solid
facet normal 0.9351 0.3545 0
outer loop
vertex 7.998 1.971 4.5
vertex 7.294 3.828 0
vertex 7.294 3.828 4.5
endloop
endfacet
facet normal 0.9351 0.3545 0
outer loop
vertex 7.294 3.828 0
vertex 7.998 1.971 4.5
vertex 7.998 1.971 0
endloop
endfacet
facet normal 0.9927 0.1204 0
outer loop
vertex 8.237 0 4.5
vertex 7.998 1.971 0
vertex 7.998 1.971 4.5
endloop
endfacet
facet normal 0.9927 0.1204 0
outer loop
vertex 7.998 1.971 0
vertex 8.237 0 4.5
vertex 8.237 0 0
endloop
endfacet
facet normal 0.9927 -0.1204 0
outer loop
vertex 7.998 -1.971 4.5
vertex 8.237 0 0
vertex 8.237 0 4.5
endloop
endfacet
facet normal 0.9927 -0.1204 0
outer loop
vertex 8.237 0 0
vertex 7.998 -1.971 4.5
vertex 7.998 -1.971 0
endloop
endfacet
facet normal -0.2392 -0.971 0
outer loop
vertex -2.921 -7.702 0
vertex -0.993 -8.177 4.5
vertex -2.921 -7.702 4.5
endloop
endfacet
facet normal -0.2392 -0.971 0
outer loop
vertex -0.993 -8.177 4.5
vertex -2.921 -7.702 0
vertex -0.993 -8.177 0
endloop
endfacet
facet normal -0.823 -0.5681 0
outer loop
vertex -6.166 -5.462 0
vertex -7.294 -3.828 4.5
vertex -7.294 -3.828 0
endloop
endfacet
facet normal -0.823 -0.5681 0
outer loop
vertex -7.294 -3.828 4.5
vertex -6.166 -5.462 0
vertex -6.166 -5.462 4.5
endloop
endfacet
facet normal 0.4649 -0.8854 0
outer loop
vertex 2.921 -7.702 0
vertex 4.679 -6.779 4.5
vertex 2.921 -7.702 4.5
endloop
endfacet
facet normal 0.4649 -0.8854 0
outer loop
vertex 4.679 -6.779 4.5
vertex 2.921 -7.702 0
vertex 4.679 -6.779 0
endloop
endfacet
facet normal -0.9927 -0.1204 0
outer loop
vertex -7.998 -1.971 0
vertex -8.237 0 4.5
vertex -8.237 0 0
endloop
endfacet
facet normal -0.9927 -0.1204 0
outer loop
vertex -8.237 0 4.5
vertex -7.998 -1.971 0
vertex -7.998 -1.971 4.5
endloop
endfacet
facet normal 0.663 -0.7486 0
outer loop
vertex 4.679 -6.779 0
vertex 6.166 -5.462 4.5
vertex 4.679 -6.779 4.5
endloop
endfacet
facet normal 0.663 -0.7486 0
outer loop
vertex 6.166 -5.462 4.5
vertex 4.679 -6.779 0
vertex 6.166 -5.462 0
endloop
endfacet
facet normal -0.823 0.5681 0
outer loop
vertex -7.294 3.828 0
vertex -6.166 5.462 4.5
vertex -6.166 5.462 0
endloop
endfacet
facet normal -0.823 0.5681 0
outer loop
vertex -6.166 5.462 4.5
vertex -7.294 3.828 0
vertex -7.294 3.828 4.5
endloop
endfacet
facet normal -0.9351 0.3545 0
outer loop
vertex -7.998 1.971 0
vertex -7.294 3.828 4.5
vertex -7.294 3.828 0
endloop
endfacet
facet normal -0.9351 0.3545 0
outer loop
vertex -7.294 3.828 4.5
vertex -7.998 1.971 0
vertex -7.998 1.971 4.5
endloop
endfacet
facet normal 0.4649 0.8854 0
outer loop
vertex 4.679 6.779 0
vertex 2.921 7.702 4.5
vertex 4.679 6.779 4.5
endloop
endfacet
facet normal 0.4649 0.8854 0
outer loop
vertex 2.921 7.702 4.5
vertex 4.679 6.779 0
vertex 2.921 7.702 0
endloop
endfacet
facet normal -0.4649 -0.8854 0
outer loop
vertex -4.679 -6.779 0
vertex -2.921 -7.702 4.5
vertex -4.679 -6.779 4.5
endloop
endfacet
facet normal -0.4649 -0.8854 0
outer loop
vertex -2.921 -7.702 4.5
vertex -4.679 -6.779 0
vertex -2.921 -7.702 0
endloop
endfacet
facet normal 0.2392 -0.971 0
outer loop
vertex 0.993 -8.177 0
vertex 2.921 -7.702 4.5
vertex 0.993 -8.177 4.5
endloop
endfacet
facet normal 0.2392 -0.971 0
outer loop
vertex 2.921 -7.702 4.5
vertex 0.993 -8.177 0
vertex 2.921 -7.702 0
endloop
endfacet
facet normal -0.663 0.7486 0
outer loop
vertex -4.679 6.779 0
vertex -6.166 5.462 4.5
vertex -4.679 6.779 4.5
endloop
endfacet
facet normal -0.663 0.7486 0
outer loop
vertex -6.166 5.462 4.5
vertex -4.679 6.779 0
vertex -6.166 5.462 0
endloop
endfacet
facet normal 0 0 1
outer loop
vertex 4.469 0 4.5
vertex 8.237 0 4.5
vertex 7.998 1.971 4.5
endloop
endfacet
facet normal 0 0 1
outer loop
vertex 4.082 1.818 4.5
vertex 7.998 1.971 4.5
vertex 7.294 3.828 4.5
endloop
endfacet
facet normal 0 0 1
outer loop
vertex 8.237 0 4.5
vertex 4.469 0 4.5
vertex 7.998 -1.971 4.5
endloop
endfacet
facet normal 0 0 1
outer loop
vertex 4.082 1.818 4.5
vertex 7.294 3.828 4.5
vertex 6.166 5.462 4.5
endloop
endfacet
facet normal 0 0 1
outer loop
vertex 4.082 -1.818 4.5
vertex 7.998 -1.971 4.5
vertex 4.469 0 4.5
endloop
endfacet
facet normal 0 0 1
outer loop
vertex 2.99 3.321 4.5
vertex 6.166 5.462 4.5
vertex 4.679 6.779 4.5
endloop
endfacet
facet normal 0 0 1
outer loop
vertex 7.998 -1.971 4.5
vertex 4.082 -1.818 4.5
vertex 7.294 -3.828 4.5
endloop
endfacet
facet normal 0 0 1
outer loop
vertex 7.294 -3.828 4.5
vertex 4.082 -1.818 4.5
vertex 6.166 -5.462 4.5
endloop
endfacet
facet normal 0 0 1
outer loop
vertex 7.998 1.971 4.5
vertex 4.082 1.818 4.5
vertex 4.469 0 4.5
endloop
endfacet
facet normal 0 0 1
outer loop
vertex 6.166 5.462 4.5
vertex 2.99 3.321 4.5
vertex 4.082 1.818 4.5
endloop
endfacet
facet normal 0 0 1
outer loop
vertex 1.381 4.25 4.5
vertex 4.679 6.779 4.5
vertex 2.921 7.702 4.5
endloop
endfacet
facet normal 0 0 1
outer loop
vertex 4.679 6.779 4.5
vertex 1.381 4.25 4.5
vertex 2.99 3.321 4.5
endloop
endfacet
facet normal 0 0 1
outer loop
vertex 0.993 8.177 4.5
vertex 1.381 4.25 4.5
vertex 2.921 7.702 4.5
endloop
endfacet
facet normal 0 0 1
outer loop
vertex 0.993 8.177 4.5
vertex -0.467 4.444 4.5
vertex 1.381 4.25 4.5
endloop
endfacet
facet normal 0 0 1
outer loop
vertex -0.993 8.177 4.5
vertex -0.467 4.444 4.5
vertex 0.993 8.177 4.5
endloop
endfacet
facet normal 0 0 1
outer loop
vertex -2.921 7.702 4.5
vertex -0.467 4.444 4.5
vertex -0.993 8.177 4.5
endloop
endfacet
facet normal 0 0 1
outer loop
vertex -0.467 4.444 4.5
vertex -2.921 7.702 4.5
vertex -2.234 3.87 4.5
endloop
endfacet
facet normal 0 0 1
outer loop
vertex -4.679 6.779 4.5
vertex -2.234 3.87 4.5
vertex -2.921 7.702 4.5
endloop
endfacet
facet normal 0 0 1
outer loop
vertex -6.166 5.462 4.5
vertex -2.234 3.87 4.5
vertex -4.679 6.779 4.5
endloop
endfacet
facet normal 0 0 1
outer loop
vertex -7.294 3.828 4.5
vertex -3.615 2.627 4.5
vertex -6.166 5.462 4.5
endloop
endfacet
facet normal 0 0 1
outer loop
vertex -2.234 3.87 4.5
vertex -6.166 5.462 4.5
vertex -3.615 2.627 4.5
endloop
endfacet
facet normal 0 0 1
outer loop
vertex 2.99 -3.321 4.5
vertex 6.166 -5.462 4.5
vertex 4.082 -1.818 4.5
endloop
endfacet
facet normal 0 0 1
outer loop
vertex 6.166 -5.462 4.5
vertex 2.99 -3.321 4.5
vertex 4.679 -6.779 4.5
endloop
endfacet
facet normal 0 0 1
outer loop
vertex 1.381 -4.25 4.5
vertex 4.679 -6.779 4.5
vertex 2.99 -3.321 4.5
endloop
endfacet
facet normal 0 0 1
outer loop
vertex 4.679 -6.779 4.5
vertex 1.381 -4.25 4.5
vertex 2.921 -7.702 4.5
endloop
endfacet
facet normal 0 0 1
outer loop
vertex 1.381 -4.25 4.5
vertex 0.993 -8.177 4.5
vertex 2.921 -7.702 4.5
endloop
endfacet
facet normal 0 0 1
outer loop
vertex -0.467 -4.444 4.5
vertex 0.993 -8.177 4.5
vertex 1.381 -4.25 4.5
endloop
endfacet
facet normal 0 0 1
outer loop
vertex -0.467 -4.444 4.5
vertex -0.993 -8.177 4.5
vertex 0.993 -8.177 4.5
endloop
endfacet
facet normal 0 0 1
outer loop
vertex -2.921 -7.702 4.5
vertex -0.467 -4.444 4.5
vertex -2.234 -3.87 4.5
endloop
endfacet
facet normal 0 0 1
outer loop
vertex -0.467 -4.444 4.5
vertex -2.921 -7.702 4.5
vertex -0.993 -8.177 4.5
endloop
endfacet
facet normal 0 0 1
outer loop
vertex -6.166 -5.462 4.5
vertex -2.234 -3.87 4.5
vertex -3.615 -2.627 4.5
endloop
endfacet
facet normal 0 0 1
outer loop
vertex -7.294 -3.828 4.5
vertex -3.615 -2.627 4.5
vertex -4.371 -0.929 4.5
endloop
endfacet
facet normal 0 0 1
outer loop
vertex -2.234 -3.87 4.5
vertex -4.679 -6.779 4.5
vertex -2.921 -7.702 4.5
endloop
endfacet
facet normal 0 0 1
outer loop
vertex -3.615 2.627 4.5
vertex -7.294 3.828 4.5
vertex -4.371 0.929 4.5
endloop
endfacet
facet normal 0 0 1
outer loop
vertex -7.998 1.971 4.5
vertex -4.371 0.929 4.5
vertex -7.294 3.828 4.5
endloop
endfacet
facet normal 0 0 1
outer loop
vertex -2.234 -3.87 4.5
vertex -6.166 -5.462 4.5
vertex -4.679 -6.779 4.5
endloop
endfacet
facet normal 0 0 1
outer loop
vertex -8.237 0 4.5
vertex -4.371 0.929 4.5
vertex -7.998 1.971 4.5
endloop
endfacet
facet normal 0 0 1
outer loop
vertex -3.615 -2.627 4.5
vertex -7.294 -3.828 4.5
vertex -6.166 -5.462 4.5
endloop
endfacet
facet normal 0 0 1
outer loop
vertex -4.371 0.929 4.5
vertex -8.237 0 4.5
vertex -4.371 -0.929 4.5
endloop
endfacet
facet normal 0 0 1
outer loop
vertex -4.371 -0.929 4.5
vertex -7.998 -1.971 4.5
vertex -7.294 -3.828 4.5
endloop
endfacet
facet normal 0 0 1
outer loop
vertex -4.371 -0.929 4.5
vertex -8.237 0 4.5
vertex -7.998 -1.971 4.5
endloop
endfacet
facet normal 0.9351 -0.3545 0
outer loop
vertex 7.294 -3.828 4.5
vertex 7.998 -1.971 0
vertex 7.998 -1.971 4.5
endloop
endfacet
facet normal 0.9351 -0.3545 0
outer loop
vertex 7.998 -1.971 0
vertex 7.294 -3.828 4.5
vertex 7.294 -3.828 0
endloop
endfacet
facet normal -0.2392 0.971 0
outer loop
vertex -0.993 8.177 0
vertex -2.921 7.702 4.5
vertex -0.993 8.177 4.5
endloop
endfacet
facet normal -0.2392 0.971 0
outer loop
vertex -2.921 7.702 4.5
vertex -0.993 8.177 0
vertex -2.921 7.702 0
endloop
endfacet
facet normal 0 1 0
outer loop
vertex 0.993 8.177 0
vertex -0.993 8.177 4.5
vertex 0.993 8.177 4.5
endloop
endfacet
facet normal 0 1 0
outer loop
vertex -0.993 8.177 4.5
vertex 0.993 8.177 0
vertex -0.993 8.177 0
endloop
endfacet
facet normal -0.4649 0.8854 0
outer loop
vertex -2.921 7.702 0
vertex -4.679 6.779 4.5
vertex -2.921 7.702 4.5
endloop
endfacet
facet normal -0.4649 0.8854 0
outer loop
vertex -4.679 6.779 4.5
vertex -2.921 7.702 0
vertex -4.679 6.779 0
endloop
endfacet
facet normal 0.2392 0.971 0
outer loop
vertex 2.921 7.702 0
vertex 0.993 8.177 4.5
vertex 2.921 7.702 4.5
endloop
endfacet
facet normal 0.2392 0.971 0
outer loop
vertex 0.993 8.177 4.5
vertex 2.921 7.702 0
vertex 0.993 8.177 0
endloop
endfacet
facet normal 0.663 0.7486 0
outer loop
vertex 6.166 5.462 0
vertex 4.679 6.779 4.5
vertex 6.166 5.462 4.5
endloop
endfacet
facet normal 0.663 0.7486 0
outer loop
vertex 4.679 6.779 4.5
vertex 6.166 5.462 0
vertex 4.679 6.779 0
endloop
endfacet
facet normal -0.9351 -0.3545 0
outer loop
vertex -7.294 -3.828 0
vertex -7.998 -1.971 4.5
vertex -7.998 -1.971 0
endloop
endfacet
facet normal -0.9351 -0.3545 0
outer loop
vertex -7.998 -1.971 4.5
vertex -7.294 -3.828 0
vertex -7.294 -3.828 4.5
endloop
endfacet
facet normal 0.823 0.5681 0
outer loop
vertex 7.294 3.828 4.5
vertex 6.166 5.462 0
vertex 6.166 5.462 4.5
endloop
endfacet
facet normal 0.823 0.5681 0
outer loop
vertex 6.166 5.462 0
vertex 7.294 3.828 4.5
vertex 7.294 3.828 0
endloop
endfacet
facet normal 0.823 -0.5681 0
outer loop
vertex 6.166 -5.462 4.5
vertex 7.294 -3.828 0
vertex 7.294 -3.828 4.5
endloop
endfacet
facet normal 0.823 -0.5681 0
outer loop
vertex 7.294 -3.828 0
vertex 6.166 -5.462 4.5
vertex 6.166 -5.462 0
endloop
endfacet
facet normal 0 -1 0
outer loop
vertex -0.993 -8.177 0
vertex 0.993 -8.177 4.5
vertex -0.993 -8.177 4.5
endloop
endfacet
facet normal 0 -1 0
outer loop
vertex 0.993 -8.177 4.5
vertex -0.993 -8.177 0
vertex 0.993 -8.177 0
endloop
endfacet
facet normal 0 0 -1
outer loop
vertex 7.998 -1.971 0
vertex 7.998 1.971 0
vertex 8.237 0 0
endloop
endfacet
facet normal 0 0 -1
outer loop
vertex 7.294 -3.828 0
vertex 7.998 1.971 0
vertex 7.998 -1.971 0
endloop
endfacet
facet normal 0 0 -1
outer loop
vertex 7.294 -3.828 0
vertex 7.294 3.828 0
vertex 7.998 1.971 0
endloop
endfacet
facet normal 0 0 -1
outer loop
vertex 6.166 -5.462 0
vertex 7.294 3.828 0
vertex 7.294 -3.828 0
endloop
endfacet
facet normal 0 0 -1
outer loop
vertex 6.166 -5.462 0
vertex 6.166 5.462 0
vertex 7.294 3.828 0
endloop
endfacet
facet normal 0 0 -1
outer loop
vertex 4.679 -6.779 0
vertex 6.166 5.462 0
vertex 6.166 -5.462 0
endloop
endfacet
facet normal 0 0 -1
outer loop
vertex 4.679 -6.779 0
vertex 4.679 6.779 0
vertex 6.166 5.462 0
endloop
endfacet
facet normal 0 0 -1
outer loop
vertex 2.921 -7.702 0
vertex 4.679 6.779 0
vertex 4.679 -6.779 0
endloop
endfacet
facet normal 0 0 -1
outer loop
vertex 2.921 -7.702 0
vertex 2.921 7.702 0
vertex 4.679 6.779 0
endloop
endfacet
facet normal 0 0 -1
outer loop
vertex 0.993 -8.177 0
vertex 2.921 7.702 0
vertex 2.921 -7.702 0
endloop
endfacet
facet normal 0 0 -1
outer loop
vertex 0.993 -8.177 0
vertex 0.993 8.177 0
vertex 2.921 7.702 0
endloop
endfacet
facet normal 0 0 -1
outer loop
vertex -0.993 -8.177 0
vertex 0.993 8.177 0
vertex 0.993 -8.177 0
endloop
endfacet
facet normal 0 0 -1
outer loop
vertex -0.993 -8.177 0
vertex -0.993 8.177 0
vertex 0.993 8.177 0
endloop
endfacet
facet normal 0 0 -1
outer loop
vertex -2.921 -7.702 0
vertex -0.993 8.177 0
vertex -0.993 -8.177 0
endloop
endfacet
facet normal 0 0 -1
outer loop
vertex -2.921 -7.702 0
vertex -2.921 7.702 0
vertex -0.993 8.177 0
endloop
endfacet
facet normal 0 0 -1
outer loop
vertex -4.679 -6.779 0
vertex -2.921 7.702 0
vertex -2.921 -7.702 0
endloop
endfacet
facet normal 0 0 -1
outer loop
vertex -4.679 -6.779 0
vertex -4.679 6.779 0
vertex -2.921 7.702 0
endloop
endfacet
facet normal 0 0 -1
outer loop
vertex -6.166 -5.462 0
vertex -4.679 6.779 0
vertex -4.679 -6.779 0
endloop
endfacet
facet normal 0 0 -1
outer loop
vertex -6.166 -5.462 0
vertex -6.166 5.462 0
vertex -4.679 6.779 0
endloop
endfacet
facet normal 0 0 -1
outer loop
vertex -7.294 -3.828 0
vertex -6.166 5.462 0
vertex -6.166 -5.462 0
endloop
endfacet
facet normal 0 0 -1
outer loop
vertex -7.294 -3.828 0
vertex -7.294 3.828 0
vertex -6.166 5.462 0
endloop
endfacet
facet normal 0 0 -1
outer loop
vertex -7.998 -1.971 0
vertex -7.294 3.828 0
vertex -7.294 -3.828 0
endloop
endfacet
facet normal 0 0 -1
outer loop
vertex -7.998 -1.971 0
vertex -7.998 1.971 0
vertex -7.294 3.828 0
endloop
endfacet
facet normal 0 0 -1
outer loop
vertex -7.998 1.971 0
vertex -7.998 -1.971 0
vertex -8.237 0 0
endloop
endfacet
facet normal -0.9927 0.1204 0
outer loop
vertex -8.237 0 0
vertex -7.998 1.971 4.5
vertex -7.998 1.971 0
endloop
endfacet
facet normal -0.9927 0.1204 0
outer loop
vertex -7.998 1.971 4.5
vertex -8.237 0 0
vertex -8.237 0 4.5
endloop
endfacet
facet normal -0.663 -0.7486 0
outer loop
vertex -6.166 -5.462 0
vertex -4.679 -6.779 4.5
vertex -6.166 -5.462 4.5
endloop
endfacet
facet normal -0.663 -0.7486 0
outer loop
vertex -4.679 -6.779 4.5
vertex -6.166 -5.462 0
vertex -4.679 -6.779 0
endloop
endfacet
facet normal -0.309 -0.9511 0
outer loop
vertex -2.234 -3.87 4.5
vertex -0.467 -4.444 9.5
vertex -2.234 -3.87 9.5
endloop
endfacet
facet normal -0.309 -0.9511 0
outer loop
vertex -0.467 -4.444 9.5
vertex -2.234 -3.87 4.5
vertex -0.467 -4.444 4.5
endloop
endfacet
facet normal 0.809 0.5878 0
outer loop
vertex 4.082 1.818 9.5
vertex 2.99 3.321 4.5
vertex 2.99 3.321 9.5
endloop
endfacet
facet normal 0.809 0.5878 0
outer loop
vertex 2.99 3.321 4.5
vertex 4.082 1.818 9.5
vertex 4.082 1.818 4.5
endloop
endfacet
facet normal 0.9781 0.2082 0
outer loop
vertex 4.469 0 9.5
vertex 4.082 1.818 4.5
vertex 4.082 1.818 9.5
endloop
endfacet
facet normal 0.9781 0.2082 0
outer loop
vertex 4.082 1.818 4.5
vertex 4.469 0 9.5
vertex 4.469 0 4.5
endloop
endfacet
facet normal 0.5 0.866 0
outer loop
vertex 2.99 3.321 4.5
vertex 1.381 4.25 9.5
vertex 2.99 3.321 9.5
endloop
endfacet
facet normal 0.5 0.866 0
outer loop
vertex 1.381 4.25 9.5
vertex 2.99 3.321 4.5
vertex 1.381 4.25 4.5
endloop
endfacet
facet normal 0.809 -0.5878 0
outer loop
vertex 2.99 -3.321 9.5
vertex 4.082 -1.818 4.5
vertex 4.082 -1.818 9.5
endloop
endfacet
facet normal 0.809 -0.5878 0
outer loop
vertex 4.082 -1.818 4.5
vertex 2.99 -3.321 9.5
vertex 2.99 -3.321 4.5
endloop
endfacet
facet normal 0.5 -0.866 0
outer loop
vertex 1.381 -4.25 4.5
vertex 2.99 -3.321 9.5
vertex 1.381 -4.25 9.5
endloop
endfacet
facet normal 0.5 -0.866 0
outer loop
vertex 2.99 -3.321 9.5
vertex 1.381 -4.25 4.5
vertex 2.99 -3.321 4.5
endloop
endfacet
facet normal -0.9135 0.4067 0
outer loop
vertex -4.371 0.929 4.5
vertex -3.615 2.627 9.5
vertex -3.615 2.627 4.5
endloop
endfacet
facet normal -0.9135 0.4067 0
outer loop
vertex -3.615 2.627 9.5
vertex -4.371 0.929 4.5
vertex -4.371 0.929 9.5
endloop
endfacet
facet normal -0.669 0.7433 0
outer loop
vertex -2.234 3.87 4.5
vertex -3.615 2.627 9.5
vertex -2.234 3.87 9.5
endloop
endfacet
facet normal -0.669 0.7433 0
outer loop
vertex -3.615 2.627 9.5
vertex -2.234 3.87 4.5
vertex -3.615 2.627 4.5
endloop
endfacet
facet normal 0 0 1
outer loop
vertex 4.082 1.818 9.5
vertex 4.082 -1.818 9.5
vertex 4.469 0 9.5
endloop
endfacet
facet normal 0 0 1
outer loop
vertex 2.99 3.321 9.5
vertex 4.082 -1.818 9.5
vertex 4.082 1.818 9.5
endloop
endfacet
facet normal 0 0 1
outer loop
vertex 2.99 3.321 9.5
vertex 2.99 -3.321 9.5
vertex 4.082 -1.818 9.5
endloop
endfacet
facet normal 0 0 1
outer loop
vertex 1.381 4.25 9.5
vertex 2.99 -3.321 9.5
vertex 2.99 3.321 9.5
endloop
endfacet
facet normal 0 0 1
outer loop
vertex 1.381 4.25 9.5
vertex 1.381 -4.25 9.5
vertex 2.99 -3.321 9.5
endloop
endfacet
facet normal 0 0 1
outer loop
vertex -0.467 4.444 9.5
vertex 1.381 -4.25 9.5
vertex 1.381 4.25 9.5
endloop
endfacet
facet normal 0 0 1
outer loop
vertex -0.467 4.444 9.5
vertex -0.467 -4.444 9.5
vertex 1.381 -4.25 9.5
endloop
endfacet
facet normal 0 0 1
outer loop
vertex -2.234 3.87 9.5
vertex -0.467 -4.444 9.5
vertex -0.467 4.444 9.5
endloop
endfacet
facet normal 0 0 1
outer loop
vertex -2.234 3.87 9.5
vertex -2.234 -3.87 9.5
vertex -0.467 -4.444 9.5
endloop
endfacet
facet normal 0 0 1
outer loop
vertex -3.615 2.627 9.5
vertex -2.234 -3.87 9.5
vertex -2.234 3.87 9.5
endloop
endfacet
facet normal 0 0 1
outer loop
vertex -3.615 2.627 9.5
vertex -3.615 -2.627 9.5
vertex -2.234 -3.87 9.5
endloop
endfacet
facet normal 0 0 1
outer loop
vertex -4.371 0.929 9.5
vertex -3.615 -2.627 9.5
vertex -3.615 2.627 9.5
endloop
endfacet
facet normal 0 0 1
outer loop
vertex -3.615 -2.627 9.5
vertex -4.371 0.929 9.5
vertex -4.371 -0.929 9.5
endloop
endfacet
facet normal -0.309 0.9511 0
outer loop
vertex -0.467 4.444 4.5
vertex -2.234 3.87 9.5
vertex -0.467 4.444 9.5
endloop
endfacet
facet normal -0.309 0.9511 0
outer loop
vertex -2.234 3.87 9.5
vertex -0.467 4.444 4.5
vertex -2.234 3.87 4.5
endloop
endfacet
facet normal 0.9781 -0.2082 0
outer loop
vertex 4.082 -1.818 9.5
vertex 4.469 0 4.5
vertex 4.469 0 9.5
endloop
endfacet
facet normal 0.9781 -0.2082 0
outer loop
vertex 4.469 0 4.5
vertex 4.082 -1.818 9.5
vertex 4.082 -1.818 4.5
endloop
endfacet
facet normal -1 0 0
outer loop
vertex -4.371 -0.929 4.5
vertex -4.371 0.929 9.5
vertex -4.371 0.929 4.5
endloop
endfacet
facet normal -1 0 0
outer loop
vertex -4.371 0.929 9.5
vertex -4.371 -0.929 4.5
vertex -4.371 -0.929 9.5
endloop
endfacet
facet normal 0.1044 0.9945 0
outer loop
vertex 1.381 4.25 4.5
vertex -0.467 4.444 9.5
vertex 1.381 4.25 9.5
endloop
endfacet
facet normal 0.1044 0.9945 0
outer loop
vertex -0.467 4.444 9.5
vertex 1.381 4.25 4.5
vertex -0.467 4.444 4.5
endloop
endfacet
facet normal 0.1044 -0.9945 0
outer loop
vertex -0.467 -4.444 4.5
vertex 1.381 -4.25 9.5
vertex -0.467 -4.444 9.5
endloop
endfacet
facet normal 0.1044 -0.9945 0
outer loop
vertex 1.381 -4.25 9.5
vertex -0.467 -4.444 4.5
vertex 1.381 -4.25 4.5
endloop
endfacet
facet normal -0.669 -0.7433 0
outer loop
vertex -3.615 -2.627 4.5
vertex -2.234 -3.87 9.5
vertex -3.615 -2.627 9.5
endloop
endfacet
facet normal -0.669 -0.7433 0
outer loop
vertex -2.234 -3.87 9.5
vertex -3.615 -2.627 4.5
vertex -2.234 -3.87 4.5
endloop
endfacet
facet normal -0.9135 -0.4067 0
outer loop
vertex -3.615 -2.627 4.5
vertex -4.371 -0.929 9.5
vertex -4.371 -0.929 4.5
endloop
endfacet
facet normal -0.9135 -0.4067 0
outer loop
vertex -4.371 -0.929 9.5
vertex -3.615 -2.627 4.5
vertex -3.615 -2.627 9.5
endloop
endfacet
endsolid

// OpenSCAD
// =====================================================
// CALCULADORA DE AVELLANADO - TORNILLOS WHITWORTH (BSW)
// El diámetro de rosca se ingresa en PULGADAS (decimal)
// Ej: 1/4" = 0.25 , 3/8" = 0.375 , 1/2" = 0.5
// =====================================================

PULGADA = 25.4; // mm por pulgada

// Convierte pulgadas a mm
function pulg_a_mm(p) = p * PULGADA;

// Tabla de diámetros nominales Whitworth más comunes (en pulgadas)
// junto a su equivalente en mm, para referencia:
// 1/8"  = 3.175 mm      5/16" = 7.938 mm      5/8" = 15.875 mm
// 3/16" = 4.763 mm      3/8"  = 9.525 mm      3/4" = 19.050 mm
// 1/4"  = 6.350 mm      7/16" = 11.113 mm     7/8" = 22.225 mm
// 5/16" = 7.938 mm      1/2"  = 12.700 mm     1"   = 25.400 mm

// Función que calcula [DK, K] en mm según el diámetro de rosca
// D_pulg: diámetro nominal en pulgadas (ej: 0.25 para 1/4")
// NOTA: al no existir una norma DIN/ISO de cabeza avellanada para
// Whitworth, se usa la regla práctica DK≈2*D, K≈0.6*D.
// Ajustar si contás con la tabla real del fabricante.
function cabeza_tornillo_whitworth(D_pulg) =
    let(D = pulg_a_mm(D_pulg))
    [D * 2.0, D * 0.6];

// =====================================================
// MÓDULO: AVELLANADO PARA TORNILLO WHITWORTH
// =====================================================
module avellanado_cilindrico_whitworth(
    diametro_rosca_pulg,      // Diámetro del tornillo en PULGADAS
    profundidad_avellano,     // Profundidad del avellanado en mm
    holgura = 0.3             // Holgura para el diámetro en mm
) {
    datos = cabeza_tornillo_whitworth(diametro_rosca_pulg);
    diametro_cabeza = datos[0];

    translate([0, 0, 0])
        cylinder(h = profundidad_avellano,
                 r = (diametro_cabeza/2) + holgura);
}

// =====================================================
// MÓDULO: AGUJERO PASANTE PARA TORNILLO WHITWORTH
// =====================================================
module agujero_pasante_whitworth(
    diametro_rosca_pulg,       // Diámetro del tornillo en PULGADAS
    profundidad,                // Profundidad total del agujero
    profundidad_avellano = 0,   // Suma del hueco de avellanado
    holgura = 0.5,               // Holgura para el diámetro en mm
    profundidad_abs = true
) {
    diametro_rosca_mm = pulg_a_mm(diametro_rosca_pulg);

    if (profundidad_abs)
        translate([0, 0, profundidad_avellano])
            cylinder(h = profundidad - profundidad_avellano,
                     r = (diametro_rosca_mm/2) + holgura);
    else
        translate([0, 0, profundidad_avellano])
            cylinder(h = profundidad,
                     r = (diametro_rosca_mm/2) + holgura);
}

// =====================================================
// MÓDULO COMBINADO - AVELLANADO + AGUJERO (WHITWORTH)
// =====================================================
module agujero_con_avellanado_whitworth(
    diametro_rosca_pulg,        // Diámetro del tornillo en PULGADAS
    profundidad_avellano,       // Profundidad del avellanado en mm
    profundidad_pieza,          // Grosor total de la pieza en mm
    holgura_avellano = 0.3,
    holgura_pasante = 0.5,
    profundidad_abs = true
) {
    avellanado_cilindrico_whitworth(
        diametro_rosca_pulg = diametro_rosca_pulg,
        profundidad_avellano = profundidad_avellano,
        holgura = holgura_avellano
    );

    agujero_pasante_whitworth(
        diametro_rosca_pulg = diametro_rosca_pulg,
        profundidad = profundidad_pieza,
        profundidad_avellano = profundidad_avellano,
        holgura = holgura_pasante,
        profundidad_abs = profundidad_abs
    );
}

// Funciones de utilidad
function diametro_cabeza_whitworth(D_pulg) = cabeza_tornillo_whitworth(D_pulg)[0];
function altura_cabeza_whitworth(D_pulg) = cabeza_tornillo_whitworth(D_pulg)[1];

// =====================================================
// EJEMPLO: tornillo Whitworth 5/16" (0.3125"), avellanado
// de 4.5mm de profundidad, pieza de 9.5mm de espesor
// =====================================================
agujero_con_avellanado_whitworth(5/16, 4.5, 9.5);
